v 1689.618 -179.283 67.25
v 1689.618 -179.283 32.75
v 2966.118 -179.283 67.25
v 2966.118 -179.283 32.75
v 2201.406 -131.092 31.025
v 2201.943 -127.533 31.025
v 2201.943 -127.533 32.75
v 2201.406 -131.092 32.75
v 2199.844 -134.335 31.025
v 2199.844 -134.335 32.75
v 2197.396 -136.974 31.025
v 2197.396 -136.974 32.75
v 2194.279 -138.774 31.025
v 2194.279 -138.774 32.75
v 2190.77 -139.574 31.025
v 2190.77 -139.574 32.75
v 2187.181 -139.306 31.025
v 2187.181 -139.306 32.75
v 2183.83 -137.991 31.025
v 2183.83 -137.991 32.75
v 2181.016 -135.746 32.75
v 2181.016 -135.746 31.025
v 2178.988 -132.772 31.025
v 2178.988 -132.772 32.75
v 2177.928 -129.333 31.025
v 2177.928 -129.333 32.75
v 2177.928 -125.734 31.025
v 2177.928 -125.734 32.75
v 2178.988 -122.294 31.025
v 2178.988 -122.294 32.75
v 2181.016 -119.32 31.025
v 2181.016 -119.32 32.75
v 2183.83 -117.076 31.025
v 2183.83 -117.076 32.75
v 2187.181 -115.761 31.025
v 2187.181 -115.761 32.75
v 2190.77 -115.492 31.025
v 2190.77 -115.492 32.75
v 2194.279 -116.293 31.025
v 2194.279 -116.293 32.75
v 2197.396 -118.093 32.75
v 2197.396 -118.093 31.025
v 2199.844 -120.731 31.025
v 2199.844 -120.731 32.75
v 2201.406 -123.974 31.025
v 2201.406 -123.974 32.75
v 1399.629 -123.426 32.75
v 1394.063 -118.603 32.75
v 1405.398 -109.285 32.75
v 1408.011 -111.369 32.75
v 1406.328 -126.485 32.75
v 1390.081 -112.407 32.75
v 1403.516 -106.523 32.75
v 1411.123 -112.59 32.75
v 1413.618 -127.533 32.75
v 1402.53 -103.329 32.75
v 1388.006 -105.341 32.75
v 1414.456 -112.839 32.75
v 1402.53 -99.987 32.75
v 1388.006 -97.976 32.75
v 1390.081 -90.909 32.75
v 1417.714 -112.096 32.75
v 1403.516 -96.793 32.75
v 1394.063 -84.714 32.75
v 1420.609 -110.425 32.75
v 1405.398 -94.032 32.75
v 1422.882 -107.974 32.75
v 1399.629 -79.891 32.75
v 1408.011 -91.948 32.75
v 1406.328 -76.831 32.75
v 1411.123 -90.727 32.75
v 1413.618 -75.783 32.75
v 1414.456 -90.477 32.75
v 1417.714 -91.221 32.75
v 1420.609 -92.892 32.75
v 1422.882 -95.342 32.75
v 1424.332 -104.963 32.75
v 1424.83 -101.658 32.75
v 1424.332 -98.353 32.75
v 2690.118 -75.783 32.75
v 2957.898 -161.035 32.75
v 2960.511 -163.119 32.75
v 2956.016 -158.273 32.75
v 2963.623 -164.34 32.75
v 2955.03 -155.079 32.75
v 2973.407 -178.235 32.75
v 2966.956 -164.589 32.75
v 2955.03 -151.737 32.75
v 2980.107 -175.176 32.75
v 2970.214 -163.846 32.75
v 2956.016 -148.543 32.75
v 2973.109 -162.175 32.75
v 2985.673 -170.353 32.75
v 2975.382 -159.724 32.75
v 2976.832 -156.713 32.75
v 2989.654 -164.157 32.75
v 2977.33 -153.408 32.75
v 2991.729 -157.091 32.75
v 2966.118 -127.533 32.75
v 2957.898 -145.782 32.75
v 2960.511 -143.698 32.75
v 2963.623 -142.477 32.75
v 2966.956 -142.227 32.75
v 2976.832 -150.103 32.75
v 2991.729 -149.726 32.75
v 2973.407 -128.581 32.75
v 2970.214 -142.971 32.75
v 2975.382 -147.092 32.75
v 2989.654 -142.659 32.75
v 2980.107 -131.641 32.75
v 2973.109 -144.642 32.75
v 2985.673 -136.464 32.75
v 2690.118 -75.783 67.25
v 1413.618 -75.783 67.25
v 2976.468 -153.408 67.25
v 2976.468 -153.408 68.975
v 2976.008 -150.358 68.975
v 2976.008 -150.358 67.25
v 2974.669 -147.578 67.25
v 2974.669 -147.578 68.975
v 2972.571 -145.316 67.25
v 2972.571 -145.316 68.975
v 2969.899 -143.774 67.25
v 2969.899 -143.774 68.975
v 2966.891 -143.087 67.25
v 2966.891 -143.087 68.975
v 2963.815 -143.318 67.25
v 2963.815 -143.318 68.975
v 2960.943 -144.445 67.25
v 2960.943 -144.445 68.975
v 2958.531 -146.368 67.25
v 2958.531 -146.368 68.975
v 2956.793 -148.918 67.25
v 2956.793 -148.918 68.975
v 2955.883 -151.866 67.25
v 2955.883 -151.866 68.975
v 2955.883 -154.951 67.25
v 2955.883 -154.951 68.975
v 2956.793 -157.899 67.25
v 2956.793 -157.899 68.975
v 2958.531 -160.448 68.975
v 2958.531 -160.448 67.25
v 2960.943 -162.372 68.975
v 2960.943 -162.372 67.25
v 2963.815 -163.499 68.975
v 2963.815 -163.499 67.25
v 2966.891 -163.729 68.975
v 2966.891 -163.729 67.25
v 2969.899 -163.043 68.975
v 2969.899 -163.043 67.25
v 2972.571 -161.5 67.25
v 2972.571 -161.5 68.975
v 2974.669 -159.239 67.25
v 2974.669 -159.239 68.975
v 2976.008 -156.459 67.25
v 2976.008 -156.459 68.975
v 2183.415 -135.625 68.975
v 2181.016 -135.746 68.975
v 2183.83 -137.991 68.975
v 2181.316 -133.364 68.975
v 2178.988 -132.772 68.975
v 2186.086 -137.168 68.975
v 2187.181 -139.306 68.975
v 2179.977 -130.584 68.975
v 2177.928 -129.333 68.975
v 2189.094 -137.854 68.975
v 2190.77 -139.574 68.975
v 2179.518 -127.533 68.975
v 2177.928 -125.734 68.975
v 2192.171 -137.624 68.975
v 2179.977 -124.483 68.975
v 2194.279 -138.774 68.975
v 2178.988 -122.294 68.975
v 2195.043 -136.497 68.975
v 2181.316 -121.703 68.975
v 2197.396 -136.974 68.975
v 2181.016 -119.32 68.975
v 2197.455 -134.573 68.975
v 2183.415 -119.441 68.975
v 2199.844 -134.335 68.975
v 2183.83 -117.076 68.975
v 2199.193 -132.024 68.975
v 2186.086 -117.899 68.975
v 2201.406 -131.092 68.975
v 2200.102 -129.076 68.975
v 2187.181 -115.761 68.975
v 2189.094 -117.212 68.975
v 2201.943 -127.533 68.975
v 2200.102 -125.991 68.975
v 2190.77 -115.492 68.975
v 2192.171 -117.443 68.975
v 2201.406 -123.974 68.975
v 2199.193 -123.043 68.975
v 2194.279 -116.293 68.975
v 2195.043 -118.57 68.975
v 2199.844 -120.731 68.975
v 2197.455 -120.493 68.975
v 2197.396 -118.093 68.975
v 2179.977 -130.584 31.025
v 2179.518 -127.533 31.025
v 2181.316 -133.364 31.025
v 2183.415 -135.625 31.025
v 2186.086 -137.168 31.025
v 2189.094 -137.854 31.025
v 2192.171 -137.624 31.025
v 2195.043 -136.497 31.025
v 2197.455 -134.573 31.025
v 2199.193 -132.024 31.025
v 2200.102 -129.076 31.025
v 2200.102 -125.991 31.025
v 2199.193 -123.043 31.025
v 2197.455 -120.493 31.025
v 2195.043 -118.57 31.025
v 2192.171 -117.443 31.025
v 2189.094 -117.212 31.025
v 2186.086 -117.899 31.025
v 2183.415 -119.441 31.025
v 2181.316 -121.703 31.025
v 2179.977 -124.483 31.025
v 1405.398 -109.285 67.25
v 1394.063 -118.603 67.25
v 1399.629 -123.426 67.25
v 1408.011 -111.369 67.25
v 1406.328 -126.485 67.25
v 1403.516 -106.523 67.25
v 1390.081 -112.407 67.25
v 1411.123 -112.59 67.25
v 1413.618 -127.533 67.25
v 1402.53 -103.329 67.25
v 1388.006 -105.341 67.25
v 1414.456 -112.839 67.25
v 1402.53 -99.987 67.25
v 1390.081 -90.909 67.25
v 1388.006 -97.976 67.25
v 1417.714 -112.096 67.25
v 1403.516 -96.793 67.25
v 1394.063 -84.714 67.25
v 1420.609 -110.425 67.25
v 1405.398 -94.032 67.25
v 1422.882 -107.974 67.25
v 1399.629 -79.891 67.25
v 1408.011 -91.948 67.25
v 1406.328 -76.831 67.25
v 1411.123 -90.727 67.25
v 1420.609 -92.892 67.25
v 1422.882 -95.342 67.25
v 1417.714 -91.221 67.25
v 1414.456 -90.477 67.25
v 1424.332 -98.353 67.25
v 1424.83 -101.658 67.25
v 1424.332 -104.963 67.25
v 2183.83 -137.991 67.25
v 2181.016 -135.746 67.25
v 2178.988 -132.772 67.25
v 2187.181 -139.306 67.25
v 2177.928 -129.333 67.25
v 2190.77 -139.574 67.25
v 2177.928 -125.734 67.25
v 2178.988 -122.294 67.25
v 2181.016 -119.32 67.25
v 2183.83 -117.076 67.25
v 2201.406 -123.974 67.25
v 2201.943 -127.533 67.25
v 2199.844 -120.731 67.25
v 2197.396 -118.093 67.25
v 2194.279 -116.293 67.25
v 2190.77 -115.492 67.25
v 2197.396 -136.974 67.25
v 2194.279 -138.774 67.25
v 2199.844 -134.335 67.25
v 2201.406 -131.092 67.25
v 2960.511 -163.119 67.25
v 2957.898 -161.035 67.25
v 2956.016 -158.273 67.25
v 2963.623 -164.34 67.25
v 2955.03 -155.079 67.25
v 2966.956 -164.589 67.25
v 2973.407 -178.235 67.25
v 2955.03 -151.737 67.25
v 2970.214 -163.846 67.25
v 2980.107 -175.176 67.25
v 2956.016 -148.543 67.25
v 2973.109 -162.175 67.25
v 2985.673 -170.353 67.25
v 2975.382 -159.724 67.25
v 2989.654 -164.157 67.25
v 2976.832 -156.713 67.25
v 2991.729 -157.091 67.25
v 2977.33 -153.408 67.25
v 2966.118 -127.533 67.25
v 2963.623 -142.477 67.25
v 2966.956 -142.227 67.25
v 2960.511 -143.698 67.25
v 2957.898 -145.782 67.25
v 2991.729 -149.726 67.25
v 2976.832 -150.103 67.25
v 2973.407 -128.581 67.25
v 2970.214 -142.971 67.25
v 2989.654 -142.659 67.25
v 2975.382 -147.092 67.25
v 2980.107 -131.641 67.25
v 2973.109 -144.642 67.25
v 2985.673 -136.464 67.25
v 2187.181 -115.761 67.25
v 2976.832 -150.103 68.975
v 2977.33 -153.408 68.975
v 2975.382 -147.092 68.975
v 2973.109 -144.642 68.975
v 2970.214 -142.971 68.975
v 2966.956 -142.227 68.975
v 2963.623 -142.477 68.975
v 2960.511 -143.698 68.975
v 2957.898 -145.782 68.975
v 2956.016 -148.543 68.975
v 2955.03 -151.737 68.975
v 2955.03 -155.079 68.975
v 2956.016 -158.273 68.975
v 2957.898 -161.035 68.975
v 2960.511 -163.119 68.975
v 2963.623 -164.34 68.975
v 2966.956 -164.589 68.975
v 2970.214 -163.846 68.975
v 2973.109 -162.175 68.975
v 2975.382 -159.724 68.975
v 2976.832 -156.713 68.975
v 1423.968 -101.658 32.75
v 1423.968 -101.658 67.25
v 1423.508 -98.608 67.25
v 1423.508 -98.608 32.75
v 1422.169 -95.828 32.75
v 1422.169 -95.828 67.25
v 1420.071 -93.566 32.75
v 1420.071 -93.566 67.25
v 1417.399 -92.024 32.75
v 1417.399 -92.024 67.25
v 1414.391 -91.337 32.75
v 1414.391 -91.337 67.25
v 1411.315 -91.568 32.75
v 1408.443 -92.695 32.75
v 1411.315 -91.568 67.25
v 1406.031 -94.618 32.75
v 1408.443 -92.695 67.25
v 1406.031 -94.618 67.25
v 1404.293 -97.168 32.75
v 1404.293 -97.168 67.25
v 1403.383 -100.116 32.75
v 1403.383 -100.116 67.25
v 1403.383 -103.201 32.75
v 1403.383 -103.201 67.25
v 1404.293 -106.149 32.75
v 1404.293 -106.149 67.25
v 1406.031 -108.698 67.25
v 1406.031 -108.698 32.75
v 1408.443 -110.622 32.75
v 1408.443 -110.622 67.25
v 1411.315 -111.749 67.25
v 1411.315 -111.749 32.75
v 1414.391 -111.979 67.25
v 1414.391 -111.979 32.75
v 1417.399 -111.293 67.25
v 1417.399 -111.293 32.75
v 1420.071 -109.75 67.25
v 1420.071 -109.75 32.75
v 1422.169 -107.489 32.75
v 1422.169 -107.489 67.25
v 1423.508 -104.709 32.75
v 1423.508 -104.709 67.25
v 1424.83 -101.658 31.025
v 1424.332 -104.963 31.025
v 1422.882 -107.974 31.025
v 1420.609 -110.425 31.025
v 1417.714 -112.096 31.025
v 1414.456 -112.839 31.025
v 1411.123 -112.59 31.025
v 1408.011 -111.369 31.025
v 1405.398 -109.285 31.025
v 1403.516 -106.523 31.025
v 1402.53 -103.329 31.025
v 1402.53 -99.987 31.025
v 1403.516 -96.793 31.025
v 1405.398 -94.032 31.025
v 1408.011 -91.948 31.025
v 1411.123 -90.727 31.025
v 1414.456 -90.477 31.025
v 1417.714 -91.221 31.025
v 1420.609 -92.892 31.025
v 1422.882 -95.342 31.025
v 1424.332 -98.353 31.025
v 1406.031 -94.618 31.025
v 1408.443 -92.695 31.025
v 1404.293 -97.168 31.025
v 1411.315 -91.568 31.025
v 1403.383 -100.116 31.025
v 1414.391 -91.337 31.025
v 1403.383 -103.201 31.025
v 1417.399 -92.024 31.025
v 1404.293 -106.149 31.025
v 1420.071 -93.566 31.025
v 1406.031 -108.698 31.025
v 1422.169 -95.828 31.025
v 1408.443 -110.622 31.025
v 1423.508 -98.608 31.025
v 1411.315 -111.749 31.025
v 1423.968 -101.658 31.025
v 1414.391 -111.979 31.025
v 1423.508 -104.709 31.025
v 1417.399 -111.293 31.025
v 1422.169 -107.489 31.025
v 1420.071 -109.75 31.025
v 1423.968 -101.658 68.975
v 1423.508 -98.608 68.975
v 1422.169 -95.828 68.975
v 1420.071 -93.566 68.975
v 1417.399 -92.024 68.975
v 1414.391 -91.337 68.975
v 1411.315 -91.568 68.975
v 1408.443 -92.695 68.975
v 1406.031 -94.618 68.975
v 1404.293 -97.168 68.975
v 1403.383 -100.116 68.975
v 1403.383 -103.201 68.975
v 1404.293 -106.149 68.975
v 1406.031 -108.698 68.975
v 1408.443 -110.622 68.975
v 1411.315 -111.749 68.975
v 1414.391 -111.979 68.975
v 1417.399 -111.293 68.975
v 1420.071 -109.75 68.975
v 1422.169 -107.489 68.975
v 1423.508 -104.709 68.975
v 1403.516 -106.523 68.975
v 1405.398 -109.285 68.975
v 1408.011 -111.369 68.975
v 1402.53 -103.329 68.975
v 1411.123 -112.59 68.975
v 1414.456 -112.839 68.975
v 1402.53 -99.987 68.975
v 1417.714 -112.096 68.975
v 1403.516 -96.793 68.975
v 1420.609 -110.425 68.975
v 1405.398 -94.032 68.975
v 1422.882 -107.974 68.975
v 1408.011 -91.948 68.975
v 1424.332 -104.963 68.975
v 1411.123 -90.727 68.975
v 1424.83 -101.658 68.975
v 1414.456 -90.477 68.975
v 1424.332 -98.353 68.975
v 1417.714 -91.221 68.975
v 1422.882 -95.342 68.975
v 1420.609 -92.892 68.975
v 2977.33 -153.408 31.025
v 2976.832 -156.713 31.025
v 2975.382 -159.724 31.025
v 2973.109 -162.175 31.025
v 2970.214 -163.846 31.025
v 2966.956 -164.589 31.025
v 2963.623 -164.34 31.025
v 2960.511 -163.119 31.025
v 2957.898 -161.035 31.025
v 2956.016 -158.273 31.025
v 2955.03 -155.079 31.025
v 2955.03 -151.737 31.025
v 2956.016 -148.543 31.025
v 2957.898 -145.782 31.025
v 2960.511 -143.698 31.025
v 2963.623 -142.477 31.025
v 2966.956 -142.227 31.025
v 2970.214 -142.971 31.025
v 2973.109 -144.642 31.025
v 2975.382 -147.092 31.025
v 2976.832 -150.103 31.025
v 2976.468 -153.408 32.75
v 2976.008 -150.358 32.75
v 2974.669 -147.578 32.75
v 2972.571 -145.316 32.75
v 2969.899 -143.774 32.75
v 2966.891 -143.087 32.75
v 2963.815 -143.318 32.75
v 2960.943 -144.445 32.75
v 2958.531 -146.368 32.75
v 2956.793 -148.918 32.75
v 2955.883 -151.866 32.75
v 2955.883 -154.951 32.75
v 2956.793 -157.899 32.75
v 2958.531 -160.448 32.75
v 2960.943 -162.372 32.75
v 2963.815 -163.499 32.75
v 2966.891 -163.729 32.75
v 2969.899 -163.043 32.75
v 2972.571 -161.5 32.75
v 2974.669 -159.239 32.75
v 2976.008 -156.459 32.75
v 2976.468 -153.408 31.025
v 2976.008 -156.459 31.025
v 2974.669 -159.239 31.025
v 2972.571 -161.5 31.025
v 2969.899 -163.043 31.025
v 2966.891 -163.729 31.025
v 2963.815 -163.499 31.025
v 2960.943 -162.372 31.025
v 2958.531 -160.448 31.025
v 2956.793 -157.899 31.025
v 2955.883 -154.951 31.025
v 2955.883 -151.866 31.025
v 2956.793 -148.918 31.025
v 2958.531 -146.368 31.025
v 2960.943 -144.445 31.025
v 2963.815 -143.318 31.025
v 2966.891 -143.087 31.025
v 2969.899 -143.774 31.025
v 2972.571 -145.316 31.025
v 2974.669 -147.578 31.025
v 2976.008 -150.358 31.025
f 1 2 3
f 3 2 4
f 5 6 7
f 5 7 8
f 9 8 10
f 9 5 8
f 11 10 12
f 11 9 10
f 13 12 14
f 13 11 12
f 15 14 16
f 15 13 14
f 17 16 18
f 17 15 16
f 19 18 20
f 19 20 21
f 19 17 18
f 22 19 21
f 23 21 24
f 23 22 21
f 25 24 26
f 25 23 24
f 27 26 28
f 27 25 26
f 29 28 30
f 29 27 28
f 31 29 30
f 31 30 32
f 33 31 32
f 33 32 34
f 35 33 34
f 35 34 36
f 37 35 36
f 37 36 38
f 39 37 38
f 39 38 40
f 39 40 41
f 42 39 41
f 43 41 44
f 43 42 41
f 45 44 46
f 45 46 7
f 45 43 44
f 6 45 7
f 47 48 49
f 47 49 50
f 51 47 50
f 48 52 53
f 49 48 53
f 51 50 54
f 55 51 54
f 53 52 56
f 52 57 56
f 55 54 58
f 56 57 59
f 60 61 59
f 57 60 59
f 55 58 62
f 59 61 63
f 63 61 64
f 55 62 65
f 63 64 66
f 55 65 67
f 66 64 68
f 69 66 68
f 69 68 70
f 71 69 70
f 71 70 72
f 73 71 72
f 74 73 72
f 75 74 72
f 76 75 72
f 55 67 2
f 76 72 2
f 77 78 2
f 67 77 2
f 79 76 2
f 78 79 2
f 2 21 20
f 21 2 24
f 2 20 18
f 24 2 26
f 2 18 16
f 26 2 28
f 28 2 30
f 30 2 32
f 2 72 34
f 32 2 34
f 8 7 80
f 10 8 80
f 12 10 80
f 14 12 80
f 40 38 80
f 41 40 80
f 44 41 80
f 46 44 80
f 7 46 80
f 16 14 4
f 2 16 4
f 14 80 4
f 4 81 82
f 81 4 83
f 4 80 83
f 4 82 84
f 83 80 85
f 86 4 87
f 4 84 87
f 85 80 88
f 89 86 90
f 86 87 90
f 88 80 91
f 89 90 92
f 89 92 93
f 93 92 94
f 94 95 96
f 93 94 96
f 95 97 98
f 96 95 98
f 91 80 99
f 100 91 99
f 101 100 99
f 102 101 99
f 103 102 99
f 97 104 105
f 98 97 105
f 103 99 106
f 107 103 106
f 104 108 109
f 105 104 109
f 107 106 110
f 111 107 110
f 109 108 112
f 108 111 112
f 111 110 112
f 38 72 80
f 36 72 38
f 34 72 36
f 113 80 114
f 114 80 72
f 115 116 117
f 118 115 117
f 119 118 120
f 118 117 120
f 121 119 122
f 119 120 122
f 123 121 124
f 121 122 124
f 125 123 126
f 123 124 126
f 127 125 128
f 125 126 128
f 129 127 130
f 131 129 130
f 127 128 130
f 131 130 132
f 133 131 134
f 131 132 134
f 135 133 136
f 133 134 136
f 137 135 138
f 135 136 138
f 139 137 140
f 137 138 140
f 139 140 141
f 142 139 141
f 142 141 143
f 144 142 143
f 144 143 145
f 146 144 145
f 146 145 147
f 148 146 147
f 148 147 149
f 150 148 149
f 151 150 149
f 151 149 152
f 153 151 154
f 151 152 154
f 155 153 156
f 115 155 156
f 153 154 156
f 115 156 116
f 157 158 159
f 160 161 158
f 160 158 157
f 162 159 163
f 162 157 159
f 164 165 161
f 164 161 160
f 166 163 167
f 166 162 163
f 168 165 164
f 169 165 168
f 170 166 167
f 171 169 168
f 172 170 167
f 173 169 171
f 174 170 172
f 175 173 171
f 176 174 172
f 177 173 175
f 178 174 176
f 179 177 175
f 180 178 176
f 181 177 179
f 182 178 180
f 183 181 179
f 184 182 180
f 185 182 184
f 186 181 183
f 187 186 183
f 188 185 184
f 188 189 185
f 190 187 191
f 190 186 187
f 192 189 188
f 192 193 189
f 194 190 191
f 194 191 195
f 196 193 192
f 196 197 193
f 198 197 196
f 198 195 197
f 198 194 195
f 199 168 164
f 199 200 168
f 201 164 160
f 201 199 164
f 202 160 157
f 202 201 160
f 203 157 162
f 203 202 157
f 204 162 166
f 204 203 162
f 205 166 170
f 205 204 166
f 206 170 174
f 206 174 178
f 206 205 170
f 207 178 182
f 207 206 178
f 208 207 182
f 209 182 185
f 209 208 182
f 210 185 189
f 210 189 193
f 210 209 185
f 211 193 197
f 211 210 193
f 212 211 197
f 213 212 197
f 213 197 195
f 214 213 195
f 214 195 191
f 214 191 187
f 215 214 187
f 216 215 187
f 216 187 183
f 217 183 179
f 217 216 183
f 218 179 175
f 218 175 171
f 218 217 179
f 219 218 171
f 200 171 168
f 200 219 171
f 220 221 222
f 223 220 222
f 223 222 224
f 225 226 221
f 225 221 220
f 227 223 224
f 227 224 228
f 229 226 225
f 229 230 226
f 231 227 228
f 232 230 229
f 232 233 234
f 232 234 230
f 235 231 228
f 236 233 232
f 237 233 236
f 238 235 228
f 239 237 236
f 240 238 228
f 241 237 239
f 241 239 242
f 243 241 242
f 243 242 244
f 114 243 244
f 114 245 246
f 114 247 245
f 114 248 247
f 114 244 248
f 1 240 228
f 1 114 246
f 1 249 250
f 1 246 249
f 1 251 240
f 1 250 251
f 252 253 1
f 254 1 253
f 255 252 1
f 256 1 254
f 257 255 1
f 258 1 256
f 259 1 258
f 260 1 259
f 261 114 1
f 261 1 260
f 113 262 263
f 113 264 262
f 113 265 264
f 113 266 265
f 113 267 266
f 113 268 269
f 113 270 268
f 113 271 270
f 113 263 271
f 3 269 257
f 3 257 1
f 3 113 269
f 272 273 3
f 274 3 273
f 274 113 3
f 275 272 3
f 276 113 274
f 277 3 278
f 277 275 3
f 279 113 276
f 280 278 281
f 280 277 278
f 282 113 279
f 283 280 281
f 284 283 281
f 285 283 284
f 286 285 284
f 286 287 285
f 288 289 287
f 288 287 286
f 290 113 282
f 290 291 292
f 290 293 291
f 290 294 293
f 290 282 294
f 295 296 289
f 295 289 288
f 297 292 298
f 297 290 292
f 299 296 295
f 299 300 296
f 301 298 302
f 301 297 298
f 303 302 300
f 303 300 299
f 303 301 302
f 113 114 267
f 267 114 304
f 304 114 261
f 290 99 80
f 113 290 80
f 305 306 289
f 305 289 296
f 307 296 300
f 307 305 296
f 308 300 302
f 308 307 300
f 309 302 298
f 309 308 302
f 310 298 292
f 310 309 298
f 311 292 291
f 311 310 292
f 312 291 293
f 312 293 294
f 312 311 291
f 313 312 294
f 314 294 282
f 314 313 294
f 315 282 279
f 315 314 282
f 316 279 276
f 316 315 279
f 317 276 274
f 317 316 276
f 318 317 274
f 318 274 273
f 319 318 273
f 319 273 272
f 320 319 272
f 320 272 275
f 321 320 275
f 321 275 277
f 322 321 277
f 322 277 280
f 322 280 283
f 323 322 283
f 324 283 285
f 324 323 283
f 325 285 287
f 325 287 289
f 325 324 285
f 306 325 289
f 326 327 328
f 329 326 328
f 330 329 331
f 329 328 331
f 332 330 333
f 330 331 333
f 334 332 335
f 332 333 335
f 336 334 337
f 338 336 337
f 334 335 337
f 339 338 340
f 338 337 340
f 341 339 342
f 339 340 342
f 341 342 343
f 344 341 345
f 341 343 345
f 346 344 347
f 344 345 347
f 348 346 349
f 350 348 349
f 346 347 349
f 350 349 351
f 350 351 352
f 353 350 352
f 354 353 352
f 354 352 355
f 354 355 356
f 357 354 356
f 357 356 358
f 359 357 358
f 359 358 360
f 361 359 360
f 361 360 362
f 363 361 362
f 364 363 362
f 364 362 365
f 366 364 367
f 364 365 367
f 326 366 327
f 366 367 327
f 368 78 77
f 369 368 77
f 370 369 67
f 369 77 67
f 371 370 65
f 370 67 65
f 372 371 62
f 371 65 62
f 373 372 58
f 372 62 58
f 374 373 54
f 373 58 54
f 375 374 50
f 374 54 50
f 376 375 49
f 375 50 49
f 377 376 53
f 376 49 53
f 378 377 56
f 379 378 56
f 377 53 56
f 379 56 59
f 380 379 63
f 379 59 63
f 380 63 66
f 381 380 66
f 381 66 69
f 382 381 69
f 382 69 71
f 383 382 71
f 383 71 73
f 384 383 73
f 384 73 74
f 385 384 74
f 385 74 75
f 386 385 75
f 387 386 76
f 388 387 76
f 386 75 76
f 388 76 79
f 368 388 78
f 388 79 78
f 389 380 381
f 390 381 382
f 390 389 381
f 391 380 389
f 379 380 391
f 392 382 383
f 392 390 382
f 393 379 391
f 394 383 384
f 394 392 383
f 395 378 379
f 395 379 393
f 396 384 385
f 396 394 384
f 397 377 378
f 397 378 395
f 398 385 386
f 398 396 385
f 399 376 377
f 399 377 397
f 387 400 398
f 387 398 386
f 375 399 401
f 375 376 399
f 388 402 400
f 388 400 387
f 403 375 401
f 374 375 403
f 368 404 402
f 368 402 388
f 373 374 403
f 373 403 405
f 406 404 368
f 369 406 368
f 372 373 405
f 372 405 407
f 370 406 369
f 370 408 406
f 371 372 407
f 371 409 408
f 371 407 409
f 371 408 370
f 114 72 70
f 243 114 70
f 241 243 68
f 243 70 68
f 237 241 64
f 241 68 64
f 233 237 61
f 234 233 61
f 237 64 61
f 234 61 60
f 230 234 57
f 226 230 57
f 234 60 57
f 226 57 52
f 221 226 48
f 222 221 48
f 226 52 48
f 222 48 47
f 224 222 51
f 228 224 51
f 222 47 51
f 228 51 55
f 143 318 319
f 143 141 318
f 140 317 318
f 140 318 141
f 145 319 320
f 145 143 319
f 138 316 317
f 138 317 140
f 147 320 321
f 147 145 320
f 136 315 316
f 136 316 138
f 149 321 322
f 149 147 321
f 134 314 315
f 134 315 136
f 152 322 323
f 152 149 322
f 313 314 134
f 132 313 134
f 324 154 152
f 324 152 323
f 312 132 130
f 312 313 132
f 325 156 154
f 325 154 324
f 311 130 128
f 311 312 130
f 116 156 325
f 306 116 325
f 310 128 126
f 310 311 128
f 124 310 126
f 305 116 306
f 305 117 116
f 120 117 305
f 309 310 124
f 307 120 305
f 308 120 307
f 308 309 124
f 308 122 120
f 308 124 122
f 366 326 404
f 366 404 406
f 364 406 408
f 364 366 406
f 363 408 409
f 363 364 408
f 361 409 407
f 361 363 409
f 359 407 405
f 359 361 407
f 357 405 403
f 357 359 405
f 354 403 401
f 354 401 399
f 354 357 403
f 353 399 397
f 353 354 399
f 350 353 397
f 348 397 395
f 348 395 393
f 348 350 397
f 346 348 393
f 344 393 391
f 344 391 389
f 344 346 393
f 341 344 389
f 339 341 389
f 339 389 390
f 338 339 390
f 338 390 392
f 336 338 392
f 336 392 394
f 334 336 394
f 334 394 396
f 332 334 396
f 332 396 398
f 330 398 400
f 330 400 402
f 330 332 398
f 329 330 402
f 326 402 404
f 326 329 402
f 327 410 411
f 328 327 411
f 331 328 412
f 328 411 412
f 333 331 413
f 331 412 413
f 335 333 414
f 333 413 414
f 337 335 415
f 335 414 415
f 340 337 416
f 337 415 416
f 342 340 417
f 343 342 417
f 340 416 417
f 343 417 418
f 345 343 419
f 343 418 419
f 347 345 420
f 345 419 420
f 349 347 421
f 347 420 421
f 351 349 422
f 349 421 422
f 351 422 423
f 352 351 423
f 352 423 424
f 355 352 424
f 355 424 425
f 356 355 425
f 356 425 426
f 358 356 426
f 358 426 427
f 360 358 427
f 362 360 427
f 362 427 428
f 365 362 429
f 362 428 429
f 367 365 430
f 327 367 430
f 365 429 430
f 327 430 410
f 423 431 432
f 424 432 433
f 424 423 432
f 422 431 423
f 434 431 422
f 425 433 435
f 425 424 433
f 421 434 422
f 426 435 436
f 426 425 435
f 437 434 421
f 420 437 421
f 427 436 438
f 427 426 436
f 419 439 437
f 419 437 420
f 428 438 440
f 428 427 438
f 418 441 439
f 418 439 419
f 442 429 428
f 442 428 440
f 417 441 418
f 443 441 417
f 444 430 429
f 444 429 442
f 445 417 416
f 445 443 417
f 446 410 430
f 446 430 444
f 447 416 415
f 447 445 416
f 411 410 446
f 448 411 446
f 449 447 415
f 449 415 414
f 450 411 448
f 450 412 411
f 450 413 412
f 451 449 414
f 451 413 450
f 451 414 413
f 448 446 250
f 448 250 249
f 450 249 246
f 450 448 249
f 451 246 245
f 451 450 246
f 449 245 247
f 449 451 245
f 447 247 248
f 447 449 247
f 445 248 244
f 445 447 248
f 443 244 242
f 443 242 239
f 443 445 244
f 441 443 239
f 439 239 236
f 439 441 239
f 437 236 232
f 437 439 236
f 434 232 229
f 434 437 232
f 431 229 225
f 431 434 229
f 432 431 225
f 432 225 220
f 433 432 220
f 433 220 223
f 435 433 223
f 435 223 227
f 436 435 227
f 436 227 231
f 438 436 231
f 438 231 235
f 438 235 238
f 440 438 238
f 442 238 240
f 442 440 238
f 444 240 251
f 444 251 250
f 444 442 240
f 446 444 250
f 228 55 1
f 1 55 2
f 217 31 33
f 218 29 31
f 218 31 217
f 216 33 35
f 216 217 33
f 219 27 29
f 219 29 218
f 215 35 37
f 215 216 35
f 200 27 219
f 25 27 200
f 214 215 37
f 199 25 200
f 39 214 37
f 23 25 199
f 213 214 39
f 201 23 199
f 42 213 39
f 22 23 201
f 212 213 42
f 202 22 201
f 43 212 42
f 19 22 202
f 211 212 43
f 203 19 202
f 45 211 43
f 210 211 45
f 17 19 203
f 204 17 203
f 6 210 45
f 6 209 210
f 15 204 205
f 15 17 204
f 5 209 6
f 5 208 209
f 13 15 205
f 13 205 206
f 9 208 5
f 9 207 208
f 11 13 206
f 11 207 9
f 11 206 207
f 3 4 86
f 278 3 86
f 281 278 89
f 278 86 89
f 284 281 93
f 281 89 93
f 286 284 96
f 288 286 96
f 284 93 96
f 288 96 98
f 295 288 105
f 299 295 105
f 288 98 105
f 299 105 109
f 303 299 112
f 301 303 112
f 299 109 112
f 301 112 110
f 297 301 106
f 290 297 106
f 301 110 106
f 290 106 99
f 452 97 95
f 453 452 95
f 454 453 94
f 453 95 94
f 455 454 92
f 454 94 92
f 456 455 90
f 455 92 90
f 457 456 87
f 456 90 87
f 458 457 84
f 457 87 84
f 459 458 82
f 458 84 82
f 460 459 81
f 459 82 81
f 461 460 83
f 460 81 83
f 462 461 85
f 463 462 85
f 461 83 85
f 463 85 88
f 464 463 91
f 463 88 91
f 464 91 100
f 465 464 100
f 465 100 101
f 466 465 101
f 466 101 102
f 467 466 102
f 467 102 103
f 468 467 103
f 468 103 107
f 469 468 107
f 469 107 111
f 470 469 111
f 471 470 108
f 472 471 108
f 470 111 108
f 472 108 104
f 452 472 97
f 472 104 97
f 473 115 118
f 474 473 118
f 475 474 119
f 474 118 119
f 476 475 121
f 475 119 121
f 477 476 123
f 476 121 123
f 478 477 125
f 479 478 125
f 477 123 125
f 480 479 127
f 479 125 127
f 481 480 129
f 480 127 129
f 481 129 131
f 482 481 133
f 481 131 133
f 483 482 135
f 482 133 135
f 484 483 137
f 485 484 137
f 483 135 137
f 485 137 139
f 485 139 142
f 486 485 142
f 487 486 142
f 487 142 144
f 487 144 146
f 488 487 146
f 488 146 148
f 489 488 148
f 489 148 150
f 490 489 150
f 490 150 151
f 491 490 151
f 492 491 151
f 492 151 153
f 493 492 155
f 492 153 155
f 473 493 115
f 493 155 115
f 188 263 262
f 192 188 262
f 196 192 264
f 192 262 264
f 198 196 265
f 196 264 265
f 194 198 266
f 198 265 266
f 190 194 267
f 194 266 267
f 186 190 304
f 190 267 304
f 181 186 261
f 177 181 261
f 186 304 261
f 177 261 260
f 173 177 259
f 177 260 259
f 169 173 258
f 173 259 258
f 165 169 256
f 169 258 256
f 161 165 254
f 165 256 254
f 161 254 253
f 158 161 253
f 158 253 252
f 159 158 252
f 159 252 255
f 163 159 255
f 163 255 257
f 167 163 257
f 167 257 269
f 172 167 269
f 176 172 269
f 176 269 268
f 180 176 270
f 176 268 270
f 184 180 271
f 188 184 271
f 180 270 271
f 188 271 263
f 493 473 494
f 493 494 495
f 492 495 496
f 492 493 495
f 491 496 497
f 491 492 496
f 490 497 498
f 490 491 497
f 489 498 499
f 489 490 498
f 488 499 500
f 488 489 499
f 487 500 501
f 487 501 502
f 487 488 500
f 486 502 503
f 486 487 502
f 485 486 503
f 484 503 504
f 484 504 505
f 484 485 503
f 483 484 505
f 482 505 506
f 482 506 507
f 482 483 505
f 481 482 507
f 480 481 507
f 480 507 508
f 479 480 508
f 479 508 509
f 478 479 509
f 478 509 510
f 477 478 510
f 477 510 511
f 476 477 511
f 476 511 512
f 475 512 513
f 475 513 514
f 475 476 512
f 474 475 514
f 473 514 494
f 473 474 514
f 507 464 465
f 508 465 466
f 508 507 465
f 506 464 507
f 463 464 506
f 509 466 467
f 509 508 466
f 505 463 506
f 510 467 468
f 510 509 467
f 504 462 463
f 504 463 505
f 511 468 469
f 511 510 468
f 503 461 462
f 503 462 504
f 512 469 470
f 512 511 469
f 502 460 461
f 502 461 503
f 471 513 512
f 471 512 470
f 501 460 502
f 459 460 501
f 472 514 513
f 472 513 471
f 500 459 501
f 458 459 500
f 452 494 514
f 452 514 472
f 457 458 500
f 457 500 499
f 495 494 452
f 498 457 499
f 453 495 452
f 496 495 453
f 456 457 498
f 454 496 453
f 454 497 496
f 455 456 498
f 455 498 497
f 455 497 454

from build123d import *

# Parameters (mm, degrees)
EXTRUDE_1_DEPTH     = 100
SKETCH_2_R          = 30
CUT_EXTRUDE_1_DEPTH = 100
SKETCH_3_R          = 32.5
SKETCH_3_R_2        = 30
EXTRUDE_2_DEPTH     = 5
EXTRUDE_START       = 5
SKETCH_4_R          = 32.5
SKETCH_4_R_2        = 30
EXTRUDE_3_DEPTH     = 5
SKETCH_5_R          = 30
CUT_EXTRUDE_2_DEPTH = 248
SKETCH_6_R          = 35
SKETCH_6_R_2        = 30
EXTRUDE_4_DEPTH     = 5
SKETCH_7_R          = 35
SKETCH_7_R_2        = 30
EXTRUDE_5_DEPTH     = 5
SCALE1_SCALE        = 0.345


with BuildPart() as part:
    # 草图1 → 凸台-拉伸1 (new body)
    with BuildSketch(Plane.XY):
        with BuildLine():
            Line((-60.1323511, -127.533248731), (739.8676489, -277.533248731))
            Line((739.8676489, -277.533248731), (4439.8676489, -277.533248731))
            ThreePointArc((4439.8676489, -277.533248731), (4514.8676489, -202.533248731), (4439.8676489, -127.533248731))
            Line((4439.8676489, -127.533248731), (3639.8676489, 22.466751269))
            Line((3639.8676489, 22.466751269), (-60.1323511, 22.466751269))
            ThreePointArc((-60.1323511, 22.466751269), (-135.1323511, -52.533248731), (-60.1323511, -127.533248731))
        make_face()
    extrude(amount=EXTRUDE_1_DEPTH)

    # 草图2 → 切除-拉伸1 (cut)
    with BuildSketch(Plane.XY.offset(100)):
        with Locations((-60.1323511, -52.533248731)):
            Circle(SKETCH_2_R)
        with Locations((4439.8676489, -202.533248731)):
            Circle(SKETCH_2_R)
    extrude(amount=-CUT_EXTRUDE_1_DEPTH, mode=Mode.SUBTRACT)

    # 草图3 → 凸台-拉伸2 (add)
    # profile 1 of 2: a face of its own
    with BuildSketch(Plane(origin=(0, 0, 0), x_dir=(-1, 0, 0), z_dir=(0, 0, -1))):
        with Locations(Location((-4439.8676489, -202.533248731, 0), (0, 0, 180))):
            Circle(SKETCH_3_R)
        with Locations(Location((-4439.8676489, -202.533248731, 0), (0, 0, 180))):
            Circle(SKETCH_3_R_2, mode=Mode.SUBTRACT)
    # profile 2 of 2: a face of its own
    with BuildSketch(Plane(origin=(0, 0, 0), x_dir=(-1, 0, 0), z_dir=(0, 0, -1))):
        with Locations(Location((60.1323511, -52.533248731, 0), (0, 0, 180))):
            Circle(SKETCH_3_R)
        with Locations(Location((60.1323511, -52.533248731, 0), (0, 0, 180))):
            Circle(SKETCH_3_R_2, mode=Mode.SUBTRACT)
    extrude(amount=EXTRUDE_2_DEPTH)

    # 草图4 → 凸台-拉伸3 (add)
    # profile 1 of 2: a face of its own
    with BuildSketch(Plane.XY.offset(100).offset(EXTRUDE_START)):
        with Locations((-60.1323511, -52.533248731)):
            Circle(SKETCH_4_R)
        with Locations((-60.1323511, -52.533248731)):
            Circle(SKETCH_4_R_2, mode=Mode.SUBTRACT)
    # profile 2 of 2: a face of its own
    with BuildSketch(Plane.XY.offset(100).offset(EXTRUDE_START)):
        with Locations((4439.8676489, -202.533248731)):
            Circle(SKETCH_4_R)
        with Locations((4439.8676489, -202.533248731)):
            Circle(SKETCH_4_R_2, mode=Mode.SUBTRACT)
    extrude(amount=-EXTRUDE_3_DEPTH)

    # 草图5 → 切除-拉伸2 (cut)
    with BuildSketch(Plane(origin=(0, 0, 0), x_dir=(-1, 0, 0), z_dir=(0, 0, -1))):
        with Locations((-2189.8676489, -127.533248731)):
            Circle(SKETCH_5_R)
    extrude(amount=-CUT_EXTRUDE_2_DEPTH, mode=Mode.SUBTRACT)

    # 草图6 → 凸台-拉伸4 (add)
    with BuildSketch(Plane(origin=(0, 0, 0), x_dir=(-1, 0, 0), z_dir=(0, 0, -1)).offset(EXTRUDE_START)):
        with Locations(Location((-2189.8676489, -127.533248731, 0), (0, 0, 180))):
            Circle(SKETCH_6_R)
        with Locations((-2189.8676489, -127.533248731)):
            Circle(SKETCH_6_R_2, mode=Mode.SUBTRACT)
    extrude(amount=-EXTRUDE_4_DEPTH)

    # 草图7 → 凸台-拉伸5 (add)
    with BuildSketch(Plane.XY.offset(100)):
        with Locations((2189.8676489, -127.533248731)):
            Circle(SKETCH_7_R)
        with Locations(Location((2189.8676489, -127.533248731, 0), (0, 0, 180))):
            Circle(SKETCH_7_R_2, mode=Mode.SUBTRACT)
    extrude(amount=EXTRUDE_5_DEPTH)


with BuildPart() as part_1:
    # Scale1: scaled about (2189.8676489, -127.533248731, 50)
    add(part.part.scale(SCALE1_SCALE).moved(Location((1434.36331003, -83.534277919, 32.75))))


solid = part_1.part
